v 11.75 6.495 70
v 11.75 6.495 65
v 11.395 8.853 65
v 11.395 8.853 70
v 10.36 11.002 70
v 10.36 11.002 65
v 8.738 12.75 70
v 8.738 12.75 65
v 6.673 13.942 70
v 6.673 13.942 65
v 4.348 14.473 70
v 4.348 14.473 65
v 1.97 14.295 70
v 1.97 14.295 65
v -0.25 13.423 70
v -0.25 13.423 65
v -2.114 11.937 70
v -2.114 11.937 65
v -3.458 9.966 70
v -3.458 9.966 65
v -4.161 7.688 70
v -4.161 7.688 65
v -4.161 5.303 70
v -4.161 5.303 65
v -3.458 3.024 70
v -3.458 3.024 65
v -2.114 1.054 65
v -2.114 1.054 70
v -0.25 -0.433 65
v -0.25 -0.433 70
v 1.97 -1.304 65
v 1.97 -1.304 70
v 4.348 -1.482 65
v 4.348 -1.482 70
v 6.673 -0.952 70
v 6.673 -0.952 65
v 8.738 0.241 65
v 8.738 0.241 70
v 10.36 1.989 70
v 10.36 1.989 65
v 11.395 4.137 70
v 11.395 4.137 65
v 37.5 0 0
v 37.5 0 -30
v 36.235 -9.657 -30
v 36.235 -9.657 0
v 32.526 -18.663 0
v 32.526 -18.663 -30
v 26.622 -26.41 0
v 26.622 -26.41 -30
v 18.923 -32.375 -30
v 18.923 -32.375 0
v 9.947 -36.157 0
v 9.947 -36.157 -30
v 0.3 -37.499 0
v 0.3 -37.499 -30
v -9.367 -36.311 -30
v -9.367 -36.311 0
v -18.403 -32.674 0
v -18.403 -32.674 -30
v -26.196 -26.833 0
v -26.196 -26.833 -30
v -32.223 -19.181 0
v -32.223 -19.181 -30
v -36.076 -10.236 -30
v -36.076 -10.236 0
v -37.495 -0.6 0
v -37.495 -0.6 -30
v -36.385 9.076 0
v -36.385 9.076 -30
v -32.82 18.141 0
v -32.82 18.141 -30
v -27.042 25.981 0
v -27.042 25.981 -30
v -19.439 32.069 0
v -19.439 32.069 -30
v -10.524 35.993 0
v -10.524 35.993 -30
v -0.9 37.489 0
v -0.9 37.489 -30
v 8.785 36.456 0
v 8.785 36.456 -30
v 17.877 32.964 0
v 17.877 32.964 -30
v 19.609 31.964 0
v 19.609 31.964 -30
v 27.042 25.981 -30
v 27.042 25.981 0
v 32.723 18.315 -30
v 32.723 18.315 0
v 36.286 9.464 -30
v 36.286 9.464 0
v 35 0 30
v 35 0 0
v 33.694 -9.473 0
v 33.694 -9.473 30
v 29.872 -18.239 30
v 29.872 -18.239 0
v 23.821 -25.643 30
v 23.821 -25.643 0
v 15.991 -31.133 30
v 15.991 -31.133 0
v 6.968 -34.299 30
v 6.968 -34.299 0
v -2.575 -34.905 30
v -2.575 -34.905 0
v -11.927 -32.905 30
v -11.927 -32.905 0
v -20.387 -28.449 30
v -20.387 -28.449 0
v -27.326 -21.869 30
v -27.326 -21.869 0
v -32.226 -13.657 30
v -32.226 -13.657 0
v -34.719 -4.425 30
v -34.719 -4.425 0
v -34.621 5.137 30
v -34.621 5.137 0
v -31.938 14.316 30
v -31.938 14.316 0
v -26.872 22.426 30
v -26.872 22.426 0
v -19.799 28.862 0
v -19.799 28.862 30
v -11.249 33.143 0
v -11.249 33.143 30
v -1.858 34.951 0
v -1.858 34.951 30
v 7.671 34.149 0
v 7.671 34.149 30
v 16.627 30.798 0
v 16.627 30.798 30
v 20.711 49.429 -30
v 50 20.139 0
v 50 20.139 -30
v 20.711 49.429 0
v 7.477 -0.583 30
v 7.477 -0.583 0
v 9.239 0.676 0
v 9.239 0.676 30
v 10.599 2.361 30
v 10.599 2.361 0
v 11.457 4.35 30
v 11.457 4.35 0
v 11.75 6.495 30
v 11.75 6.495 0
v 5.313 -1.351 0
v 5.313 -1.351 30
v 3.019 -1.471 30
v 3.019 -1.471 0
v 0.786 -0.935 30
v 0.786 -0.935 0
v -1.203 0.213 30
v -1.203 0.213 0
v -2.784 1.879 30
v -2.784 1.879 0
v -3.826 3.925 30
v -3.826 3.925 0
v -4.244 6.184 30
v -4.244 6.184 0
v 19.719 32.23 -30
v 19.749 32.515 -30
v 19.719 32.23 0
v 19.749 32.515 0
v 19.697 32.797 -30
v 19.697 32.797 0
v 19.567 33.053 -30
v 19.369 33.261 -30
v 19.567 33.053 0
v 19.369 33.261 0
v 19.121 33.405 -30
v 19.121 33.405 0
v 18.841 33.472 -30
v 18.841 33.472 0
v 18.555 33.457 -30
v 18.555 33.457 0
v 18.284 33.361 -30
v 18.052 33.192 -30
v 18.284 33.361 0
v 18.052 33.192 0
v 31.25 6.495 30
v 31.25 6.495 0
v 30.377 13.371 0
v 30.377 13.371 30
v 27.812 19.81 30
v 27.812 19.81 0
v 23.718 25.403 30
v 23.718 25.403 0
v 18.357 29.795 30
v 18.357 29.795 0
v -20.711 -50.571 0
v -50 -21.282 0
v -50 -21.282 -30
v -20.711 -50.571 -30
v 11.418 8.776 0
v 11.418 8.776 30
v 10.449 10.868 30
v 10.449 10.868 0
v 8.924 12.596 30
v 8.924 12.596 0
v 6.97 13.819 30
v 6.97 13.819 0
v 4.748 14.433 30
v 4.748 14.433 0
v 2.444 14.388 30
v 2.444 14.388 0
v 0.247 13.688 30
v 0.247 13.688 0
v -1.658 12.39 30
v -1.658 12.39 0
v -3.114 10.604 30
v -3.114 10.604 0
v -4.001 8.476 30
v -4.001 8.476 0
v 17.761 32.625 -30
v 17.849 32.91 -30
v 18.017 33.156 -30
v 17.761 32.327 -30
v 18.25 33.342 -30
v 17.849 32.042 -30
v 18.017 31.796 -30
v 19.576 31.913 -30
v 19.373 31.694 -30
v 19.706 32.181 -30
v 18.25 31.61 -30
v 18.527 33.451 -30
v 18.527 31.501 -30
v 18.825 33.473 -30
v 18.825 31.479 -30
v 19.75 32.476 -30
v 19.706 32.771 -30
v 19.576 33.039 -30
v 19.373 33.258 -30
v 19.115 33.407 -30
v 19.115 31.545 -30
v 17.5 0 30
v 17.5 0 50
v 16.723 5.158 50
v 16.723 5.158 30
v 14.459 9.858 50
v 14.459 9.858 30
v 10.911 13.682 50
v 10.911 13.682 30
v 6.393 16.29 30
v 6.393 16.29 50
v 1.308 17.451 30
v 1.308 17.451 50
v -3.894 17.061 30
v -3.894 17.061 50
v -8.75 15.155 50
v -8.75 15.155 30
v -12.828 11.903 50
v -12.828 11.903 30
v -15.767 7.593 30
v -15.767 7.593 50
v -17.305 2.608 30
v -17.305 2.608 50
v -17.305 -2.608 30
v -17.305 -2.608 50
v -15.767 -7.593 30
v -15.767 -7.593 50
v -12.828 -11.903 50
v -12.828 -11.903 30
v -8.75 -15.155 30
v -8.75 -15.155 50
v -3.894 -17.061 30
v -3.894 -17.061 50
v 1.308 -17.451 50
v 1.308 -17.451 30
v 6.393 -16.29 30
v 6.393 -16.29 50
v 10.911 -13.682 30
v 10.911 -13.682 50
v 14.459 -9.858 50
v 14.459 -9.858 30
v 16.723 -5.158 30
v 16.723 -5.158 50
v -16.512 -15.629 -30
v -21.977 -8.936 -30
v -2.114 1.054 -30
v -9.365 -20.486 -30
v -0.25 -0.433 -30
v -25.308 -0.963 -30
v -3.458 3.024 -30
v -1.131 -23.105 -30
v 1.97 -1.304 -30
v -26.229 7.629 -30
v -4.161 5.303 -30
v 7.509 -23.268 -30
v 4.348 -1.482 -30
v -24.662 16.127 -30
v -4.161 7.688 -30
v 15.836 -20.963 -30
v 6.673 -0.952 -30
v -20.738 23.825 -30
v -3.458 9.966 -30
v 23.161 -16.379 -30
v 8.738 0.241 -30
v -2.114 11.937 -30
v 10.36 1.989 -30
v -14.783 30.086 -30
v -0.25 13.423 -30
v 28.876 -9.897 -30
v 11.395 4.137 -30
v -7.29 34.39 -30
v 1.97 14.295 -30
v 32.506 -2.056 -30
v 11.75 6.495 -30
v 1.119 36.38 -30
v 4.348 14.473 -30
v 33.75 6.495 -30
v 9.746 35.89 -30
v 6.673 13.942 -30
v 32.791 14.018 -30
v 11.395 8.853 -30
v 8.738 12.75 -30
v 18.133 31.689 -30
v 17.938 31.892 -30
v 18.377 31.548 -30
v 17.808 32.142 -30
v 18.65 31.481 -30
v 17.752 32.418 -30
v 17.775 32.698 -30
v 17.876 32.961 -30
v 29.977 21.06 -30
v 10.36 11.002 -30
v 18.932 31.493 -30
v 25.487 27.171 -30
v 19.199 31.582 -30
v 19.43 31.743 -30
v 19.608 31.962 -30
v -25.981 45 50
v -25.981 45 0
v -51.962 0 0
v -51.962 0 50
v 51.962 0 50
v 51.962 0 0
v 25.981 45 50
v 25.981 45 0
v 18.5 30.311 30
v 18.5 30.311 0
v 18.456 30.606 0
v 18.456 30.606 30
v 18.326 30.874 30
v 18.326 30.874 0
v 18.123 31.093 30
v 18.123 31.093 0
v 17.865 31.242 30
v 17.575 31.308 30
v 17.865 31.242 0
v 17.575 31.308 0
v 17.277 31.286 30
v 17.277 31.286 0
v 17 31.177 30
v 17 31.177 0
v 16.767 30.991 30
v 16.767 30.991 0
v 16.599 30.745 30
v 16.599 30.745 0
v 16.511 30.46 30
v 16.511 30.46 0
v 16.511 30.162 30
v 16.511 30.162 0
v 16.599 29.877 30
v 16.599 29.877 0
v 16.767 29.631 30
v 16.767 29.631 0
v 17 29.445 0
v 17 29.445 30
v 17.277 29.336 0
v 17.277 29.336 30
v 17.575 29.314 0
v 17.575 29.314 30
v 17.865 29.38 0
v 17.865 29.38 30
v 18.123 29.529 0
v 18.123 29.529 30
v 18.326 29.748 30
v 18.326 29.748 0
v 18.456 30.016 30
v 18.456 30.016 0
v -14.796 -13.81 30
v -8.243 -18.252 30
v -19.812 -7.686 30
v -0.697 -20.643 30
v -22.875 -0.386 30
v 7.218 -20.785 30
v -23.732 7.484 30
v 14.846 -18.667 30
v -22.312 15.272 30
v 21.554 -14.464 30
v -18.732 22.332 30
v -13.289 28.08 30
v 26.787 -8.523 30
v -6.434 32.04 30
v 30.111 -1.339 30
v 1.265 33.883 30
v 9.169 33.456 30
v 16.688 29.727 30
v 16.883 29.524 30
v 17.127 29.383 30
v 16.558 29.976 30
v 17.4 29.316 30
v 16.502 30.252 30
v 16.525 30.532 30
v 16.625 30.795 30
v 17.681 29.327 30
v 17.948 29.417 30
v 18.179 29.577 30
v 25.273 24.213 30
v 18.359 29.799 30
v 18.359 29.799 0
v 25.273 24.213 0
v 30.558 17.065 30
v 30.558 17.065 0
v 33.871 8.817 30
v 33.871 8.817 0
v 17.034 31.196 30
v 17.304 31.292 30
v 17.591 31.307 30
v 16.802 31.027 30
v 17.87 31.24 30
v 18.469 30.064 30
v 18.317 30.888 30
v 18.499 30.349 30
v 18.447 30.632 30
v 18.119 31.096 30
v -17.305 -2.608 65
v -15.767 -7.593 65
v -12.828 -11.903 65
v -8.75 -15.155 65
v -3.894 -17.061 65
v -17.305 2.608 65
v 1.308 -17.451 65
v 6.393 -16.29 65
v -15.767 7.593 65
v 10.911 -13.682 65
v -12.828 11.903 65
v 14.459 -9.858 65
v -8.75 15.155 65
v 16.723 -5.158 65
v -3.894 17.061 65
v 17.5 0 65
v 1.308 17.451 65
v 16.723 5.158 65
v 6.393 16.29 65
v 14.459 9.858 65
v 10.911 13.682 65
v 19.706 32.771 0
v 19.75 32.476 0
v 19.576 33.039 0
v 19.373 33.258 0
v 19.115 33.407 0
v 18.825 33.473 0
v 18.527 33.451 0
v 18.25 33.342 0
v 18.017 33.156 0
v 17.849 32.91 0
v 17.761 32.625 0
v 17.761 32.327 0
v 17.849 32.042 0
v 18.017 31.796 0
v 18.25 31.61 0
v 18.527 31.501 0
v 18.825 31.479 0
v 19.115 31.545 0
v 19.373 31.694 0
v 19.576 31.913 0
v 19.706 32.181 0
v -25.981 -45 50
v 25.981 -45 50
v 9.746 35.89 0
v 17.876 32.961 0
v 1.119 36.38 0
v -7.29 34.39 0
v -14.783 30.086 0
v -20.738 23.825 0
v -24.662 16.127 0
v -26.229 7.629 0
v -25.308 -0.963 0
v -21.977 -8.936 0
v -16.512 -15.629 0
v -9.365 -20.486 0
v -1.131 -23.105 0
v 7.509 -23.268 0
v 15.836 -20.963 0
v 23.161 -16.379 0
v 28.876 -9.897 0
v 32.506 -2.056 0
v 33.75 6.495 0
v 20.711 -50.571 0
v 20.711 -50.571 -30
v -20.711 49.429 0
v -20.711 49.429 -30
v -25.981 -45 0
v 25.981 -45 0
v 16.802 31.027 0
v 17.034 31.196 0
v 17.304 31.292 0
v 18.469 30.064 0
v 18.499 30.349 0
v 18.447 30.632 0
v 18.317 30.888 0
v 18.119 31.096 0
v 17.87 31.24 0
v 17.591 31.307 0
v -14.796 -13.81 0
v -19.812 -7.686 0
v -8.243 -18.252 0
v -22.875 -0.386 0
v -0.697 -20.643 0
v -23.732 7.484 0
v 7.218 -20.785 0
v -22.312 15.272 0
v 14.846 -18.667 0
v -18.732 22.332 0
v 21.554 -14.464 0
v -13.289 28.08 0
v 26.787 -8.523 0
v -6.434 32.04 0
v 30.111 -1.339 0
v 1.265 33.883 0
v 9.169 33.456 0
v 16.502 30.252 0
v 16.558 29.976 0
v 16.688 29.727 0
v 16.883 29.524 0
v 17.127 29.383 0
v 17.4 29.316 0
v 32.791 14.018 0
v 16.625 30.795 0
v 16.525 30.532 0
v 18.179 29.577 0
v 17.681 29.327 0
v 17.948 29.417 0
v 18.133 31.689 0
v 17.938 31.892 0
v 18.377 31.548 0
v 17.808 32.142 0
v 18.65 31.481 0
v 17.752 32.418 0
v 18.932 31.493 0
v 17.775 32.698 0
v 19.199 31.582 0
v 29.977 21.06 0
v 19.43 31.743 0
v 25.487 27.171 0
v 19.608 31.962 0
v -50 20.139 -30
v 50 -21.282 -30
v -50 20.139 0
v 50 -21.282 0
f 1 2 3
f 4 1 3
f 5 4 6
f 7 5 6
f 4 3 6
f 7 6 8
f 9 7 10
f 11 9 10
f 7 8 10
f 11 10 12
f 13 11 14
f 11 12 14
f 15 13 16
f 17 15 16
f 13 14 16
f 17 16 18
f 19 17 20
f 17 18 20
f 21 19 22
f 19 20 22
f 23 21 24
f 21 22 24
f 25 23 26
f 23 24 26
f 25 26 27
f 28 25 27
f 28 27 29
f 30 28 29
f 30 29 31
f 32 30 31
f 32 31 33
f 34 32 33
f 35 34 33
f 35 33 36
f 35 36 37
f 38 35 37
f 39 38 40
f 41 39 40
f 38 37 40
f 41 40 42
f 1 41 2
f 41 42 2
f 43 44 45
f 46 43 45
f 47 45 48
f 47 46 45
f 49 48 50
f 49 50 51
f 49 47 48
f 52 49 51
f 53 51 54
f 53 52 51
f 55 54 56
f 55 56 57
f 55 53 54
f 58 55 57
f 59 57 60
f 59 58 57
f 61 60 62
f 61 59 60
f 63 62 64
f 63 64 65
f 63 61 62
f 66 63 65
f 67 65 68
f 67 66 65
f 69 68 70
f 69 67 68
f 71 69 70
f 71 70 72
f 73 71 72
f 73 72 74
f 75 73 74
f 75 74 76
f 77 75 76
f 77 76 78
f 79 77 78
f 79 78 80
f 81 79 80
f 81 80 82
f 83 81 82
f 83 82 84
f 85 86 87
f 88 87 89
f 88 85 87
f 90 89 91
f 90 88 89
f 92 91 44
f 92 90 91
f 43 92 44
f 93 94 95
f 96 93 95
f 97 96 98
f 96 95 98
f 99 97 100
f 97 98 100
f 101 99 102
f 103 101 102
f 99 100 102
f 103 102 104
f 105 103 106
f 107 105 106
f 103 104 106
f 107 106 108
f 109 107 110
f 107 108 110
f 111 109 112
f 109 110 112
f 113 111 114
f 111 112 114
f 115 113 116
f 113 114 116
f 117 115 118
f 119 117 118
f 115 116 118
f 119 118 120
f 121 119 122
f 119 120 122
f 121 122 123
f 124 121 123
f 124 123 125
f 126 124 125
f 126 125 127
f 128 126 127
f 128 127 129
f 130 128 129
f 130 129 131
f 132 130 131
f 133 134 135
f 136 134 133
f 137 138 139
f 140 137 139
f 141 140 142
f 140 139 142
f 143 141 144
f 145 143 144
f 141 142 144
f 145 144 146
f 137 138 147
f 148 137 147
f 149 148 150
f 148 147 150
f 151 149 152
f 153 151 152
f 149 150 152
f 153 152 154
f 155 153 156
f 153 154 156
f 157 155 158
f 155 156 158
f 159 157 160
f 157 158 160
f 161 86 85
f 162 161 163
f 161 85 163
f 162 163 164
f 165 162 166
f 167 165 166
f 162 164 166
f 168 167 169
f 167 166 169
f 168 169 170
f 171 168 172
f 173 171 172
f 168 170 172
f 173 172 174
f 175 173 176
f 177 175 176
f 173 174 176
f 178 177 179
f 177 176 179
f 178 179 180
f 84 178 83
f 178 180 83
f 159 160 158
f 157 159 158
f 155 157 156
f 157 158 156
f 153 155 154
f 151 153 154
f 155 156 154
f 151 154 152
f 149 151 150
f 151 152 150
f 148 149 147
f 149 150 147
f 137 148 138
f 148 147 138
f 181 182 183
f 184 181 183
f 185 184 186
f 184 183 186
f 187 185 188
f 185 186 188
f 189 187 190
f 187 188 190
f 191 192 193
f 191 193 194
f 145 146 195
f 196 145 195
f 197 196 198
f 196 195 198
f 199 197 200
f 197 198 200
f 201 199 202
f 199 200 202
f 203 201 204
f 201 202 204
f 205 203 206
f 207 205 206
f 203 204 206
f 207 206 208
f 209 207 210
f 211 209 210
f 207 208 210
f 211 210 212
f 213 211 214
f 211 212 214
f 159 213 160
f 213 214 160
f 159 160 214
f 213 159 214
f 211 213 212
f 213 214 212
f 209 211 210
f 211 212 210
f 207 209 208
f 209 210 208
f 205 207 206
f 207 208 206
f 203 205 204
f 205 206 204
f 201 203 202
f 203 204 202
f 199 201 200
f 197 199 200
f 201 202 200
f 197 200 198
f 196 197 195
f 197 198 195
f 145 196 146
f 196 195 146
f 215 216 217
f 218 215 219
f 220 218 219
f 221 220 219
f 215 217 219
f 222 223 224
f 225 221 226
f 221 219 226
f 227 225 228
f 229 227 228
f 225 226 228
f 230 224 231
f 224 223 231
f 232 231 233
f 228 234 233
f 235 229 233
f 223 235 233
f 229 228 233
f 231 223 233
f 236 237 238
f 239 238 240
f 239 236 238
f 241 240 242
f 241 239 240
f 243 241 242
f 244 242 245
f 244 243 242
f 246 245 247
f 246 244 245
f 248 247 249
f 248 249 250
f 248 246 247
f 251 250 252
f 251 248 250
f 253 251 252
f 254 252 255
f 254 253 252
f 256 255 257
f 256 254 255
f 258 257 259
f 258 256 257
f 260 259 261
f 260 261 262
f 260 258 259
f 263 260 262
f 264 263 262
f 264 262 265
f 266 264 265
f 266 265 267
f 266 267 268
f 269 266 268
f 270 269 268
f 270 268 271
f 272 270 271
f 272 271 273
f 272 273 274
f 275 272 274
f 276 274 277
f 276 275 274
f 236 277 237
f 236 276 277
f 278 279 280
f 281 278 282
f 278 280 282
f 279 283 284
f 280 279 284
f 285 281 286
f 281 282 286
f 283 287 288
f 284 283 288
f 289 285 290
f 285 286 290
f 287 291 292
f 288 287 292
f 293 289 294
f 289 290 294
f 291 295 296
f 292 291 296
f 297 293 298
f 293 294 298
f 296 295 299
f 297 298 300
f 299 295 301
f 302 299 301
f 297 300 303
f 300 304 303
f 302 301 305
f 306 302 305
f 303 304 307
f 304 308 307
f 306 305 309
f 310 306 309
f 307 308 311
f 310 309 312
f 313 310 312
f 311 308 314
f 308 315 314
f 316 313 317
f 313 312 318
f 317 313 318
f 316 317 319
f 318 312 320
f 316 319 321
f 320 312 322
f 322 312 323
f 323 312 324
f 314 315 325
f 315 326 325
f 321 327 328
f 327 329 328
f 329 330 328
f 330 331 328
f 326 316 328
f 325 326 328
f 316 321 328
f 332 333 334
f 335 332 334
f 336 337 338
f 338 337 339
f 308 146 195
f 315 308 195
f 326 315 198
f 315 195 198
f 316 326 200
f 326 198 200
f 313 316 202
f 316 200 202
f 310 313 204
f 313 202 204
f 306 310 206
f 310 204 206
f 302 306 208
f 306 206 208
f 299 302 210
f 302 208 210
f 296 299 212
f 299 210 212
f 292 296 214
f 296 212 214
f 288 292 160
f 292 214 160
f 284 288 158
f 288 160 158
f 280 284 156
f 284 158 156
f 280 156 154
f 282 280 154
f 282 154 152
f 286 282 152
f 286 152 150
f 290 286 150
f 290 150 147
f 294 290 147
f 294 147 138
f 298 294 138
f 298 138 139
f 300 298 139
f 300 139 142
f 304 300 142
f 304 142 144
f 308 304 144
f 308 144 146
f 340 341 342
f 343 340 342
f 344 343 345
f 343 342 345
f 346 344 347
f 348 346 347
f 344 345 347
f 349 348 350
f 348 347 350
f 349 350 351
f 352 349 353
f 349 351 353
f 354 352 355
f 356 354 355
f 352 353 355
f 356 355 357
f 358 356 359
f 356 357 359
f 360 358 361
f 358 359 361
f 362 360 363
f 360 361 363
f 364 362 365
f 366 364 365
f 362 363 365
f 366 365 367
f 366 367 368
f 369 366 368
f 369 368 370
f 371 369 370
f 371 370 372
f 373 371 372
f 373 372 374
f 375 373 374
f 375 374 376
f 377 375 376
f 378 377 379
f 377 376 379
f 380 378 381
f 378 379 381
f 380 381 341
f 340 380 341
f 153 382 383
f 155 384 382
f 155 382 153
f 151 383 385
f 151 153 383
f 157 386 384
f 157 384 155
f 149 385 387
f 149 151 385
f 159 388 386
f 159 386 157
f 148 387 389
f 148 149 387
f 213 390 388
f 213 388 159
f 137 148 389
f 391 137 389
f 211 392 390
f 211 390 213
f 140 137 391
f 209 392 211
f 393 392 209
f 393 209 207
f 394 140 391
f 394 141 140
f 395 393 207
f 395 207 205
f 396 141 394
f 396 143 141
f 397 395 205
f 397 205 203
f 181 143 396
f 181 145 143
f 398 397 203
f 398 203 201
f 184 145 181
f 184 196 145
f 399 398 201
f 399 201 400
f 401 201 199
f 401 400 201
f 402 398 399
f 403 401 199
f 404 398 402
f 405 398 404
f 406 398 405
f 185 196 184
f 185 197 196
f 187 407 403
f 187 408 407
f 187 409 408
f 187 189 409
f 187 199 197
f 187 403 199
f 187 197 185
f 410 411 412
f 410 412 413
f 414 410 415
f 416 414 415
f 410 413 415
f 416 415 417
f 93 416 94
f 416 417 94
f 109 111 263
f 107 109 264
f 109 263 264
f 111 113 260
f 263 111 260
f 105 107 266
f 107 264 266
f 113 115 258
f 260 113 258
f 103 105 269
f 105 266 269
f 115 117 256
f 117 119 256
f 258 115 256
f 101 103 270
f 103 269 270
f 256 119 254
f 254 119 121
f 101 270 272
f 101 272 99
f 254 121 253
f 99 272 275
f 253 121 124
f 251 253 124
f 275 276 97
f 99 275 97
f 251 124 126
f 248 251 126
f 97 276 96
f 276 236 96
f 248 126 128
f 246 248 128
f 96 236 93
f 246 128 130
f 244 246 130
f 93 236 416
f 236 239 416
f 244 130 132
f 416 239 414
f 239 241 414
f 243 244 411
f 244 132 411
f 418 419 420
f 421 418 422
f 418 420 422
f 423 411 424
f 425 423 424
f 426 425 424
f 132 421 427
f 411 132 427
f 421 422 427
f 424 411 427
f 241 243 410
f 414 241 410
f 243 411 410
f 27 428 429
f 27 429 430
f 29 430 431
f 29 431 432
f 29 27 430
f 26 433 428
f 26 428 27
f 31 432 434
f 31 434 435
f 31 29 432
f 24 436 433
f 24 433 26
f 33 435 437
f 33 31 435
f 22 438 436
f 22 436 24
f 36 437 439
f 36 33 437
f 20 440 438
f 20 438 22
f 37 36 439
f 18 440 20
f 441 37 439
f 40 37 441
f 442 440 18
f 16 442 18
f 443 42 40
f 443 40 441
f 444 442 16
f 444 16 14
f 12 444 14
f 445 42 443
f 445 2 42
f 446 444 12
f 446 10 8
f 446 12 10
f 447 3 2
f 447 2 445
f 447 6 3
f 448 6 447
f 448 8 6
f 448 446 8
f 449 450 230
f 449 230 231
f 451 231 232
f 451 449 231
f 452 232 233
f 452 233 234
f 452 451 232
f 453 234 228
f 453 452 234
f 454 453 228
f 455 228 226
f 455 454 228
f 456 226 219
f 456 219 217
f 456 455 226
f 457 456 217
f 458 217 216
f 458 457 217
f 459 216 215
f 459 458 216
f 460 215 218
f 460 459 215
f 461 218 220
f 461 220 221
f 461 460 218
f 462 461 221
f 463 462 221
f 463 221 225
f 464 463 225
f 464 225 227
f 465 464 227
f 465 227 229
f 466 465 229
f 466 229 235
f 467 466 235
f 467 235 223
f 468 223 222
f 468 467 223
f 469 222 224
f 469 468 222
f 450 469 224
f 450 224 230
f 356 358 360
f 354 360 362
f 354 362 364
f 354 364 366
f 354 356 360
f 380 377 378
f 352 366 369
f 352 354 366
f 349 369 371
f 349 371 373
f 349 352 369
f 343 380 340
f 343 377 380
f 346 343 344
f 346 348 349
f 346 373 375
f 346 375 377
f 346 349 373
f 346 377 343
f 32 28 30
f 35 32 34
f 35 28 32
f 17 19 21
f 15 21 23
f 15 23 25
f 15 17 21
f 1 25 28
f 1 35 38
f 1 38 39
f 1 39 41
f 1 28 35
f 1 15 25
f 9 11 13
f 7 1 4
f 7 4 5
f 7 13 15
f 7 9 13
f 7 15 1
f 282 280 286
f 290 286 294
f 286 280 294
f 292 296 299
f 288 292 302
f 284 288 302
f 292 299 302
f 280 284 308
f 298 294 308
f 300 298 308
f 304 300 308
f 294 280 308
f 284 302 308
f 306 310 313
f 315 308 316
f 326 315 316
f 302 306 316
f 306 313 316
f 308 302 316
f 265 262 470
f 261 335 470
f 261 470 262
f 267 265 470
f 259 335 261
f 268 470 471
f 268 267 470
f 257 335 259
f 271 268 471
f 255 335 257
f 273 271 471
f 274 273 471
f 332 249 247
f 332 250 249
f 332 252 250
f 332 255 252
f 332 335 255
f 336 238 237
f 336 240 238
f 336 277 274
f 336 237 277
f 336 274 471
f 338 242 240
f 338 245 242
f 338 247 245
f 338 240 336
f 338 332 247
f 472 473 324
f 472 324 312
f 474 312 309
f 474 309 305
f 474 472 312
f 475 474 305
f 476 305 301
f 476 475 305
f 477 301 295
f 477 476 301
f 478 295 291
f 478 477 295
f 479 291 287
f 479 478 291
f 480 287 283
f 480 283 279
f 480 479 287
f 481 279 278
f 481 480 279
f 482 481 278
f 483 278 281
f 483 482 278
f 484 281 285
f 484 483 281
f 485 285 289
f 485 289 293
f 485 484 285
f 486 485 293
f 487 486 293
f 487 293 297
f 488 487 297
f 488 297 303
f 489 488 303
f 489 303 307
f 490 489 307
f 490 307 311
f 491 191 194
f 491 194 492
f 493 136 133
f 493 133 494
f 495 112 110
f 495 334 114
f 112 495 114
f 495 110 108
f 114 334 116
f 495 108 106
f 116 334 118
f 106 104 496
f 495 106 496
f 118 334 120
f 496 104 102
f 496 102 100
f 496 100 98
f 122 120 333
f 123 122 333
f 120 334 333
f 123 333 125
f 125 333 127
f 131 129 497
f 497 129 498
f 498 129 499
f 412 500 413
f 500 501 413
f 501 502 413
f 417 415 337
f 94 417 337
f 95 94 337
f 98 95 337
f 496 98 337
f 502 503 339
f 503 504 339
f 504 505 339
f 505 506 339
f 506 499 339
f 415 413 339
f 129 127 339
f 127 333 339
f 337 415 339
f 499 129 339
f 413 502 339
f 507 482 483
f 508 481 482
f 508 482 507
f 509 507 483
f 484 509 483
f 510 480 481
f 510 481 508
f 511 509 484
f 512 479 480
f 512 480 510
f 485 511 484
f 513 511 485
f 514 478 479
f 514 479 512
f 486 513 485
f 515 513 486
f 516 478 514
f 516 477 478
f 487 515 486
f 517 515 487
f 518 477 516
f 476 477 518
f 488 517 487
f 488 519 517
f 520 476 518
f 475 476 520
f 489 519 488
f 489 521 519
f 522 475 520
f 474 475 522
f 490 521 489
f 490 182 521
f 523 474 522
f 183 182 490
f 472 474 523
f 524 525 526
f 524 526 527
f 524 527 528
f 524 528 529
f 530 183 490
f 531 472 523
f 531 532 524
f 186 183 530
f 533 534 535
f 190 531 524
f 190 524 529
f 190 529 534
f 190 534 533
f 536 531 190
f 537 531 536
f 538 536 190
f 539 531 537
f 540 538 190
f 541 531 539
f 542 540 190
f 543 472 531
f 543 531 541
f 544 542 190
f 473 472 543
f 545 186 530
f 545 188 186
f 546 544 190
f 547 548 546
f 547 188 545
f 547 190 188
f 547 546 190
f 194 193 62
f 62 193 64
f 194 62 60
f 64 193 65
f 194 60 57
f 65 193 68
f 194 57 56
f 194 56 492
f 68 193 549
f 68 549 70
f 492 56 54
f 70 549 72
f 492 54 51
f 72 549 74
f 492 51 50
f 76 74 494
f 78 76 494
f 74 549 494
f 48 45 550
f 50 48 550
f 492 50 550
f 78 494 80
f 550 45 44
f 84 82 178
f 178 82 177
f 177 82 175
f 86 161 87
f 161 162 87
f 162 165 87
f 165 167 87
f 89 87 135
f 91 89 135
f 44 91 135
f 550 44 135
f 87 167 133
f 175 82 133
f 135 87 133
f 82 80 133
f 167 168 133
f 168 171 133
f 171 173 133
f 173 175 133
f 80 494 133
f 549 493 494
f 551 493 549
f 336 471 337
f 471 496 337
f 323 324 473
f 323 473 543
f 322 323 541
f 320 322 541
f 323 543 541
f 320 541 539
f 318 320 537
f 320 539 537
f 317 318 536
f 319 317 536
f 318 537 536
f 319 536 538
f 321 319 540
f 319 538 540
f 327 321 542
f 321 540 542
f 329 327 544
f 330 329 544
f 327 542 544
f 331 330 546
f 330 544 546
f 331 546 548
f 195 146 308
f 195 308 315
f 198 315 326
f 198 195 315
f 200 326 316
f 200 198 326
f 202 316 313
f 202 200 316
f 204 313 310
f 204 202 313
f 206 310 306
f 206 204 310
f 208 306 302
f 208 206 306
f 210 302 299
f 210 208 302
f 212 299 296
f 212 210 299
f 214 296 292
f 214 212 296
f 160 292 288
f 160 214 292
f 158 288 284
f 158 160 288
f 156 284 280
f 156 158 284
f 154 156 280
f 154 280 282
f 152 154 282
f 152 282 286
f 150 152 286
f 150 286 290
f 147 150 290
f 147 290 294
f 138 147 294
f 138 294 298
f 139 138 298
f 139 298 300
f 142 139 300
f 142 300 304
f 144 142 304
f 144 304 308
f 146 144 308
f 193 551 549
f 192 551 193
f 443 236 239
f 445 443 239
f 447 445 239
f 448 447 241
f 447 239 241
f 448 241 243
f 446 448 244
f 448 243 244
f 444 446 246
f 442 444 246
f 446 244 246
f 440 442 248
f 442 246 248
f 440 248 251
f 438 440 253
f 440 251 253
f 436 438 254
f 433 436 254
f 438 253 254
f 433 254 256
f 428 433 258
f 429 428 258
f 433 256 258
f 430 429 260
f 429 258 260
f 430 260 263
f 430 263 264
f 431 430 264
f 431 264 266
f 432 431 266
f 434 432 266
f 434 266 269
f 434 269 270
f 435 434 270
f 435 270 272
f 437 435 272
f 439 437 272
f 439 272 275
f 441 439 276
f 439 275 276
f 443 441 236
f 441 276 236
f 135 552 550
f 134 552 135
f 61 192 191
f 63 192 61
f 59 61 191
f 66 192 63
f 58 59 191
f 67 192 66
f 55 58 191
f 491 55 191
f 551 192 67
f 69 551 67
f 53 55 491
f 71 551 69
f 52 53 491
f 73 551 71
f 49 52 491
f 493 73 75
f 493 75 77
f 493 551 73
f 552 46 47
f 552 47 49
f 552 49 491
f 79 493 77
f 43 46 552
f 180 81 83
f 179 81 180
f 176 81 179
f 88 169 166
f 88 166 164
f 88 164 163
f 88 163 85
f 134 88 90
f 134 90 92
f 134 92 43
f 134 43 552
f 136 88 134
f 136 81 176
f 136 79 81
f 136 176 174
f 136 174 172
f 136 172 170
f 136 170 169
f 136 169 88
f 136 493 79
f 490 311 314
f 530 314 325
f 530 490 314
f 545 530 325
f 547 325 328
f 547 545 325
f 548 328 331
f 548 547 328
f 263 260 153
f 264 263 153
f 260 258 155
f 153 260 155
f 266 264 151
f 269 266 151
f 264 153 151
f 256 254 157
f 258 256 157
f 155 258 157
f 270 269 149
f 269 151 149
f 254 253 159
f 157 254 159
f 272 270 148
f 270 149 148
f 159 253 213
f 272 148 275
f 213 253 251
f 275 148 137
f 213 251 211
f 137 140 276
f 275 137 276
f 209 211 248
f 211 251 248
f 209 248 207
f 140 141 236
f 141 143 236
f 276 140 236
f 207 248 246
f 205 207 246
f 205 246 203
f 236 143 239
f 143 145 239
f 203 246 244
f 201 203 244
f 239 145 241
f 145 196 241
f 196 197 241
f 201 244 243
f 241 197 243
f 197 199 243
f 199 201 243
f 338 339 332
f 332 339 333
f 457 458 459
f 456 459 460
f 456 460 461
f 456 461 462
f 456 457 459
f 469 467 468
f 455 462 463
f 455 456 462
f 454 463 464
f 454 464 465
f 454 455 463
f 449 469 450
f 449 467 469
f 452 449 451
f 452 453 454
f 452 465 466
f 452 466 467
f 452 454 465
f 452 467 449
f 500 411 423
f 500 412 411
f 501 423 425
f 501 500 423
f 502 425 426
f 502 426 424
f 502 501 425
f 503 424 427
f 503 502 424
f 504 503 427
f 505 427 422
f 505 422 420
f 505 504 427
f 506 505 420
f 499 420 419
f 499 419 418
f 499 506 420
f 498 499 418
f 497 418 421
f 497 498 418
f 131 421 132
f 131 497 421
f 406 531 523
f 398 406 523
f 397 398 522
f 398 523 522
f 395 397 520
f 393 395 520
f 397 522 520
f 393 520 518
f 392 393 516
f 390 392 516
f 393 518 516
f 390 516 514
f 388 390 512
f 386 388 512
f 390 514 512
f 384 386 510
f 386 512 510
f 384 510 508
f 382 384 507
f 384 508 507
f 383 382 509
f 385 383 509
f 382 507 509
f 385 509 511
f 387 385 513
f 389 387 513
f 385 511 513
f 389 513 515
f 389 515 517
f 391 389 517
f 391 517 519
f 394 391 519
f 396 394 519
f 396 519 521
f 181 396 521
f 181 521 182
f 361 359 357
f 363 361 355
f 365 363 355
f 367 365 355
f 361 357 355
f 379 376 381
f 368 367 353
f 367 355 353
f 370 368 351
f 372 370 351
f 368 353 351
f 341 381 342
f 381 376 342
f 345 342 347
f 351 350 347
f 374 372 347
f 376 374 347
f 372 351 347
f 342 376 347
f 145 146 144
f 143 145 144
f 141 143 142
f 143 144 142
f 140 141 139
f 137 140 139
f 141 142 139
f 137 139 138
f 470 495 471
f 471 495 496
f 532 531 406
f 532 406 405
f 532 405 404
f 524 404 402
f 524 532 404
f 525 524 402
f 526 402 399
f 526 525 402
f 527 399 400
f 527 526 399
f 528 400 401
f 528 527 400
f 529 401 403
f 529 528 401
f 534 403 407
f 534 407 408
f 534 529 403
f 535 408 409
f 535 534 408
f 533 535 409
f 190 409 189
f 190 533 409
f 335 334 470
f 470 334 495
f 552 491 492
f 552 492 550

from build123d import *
from build123d import SkipClean  # not in build123d's __all__

# Parameters (mm, degrees)
F1_DEPTH  = 30
F2_R      = 17.5
F3_DEPTH  = 20
F0_R      = 17.5
F4_DEPTH  = 30
F5_R      = 17.5
F6_DEPTH  = 35
F7_DEPTH  = 30
F8_R      = 8
F9_DEPTH  = 30
F10_R     = 8
F11_DEPTH = 5
F13_DEPTH = 30
F14_R     = 8
F15_DEPTH = 30
F16_R     = 1
F17_DEPTH = 30
F18_DEPTH = 30


# Not quite as in the source:
# - after a boolean that leaves OpenCascade's solid faulty, fix() repairs it


with BuildPart() as f1:
    # F0 (on Top) → F1 (new body)
    with BuildSketch(Plane.XY):
        with BuildLine():
            ThreePointArc((7.4772695936, -0.5834718719), (7.494315244, -0.29195723), (7.5, 0))
            ThreePointArc((7.5, 0), (6.4951905284, 3.75), (3.75, 6.4951905284))
            ThreePointArc((3.75, 6.4951905284), (-0.29195723, 7.494315244), (-4.2439362602, 6.183769483))
            ThreePointArc((-4.2439362602, 6.183769483), (-0.25, -0.4330127019), (7.4772695936, -0.5834718719))
        make_face()
        with BuildLine():
            ThreePointArc((3.75, 6.4951905284), (6.4951905284, 3.75), (7.5, 0))
            ThreePointArc((7.5, 0), (7.494315244, -0.29195723), (7.4772695936, -0.5834718719))
            ThreePointArc((7.4772695936, -0.5834718719), (10.5990202492, 2.3610737393), (11.75, 6.4951905284))
            ThreePointArc((11.75, 6.4951905284), (3.5942599631, 14.4936744498), (-4.2439362602, 6.183769483))
            ThreePointArc((-4.2439362602, 6.183769483), (-0.29195723, 7.494315244), (3.75, 6.4951905284))
        make_face()
    extrude(amount=F1_DEPTH)

    # F5 (on face) → F6 (join)
    with BuildSketch(Plane.XY.offset(30)):
        Circle(F5_R)
        with BuildLine():
            ThreePointArc((-4.2439362602, 6.183769483), (7.75, 13.4233937587), (7.4772695936, -0.5834718719))
            ThreePointArc((7.4772695936, -0.5834718719), (-3.75, -6.4951905284), (-4.2439362602, 6.183769483))
        make_face(mode=Mode.SUBTRACT)
        with BuildLine():
            ThreePointArc((-4.2439362602, 6.183769483), (-3.75, -6.4951905284), (7.4772695936, -0.5834718719))
            ThreePointArc((7.4772695936, -0.5834718719), (7.75, 13.4233937587), (-4.2439362602, 6.183769483))
        make_face()
    extrude(amount=F6_DEPTH)

    # F8 (on face) → F9 (join)
    with BuildSketch(Plane.XY):
        with Locations((3.75, 6.4951905284)):
            Circle(F8_R)
    extrude(amount=-F9_DEPTH)

    # F10 (on face) → F11 (join)
    with BuildSketch(Plane.XY.offset(65)):
        with Locations((3.75, 6.4951905284)):
            Circle(F10_R)
    extrude(amount=F11_DEPTH)


with BuildPart() as f1b:
    # F0 (on Top) → F1, piece 2 (new body)
    with BuildSketch(Plane.XY):
        Polygon((25.9807621135, 45), (-25.9807621135, 45), (-51.9615242271, 0), (-25.9807621135, -45), (25.9807621135, -45), (51.9615242271, 0), align=None)
        with BuildLine():
            ThreePointArc((35, 0), (-30.3108892273, -17.4999998357), (17.5000003287, 30.3108889427))
            ThreePointArc((17.5000003287, 30.3108889427), (30.3108892273, 17.4999998357), (35, 0))
        make_face(mode=Mode.SUBTRACT)
    extrude(amount=F1_DEPTH)

    # F2 (on face) → F3 (join)
    with BuildSketch(Plane.XY.offset(30)):
        Polygon((-25.9807621135, 45), (-51.9615242271, 0), (-25.9807621135, -45), (25.9807621135, -45), (51.9615242271, 0), (25.9807621135, 45), align=None)
        Circle(F2_R, mode=Mode.SUBTRACT)
    extrude(amount=F3_DEPTH)


with BuildPart() as f4:
    # F0 (on Top) → F4 (new body)
    with BuildSketch(Plane.XY):
        with BuildLine():
            ThreePointArc((17.5000003287, 30.3108889427), (-20.0656986989, -7.2548093073), (31.25, 6.4951905284))
            ThreePointArc((31.25, 6.4951905284), (27.5656986989, 20.2451903641), (17.5000003287, 30.3108889427))
        make_face()
        Circle(F0_R, mode=Mode.SUBTRACT)
        Circle(F0_R)
        with BuildLine():
            ThreePointArc((11.75, 6.4951905284), (10.5990202492, 2.3610737393), (7.4772695936, -0.5834718719))
            ThreePointArc((7.4772695936, -0.5834718719), (-3.75, -6.4951905284), (-4.2439362602, 6.183769483))
            ThreePointArc((-4.2439362602, 6.183769483), (3.5942599631, 14.4936744498), (11.75, 6.4951905284))
        make_face(mode=Mode.SUBTRACT)
    extrude(amount=F4_DEPTH)

    # F0 (on Top) → F7 (join)
    with BuildSketch(Plane.XY):
        with BuildLine():
            ThreePointArc((17.5000003287, 30.3108889427), (-20.0656986989, -7.2548093073), (31.25, 6.4951905284))
            ThreePointArc((31.25, 6.4951905284), (27.5656986989, 20.2451903641), (17.5000003287, 30.3108889427))
        make_face()
        Circle(F0_R, mode=Mode.SUBTRACT)
        Circle(F0_R)
        with BuildLine():
            ThreePointArc((11.75, 6.4951905284), (10.5990202492, 2.3610737393), (7.4772695936, -0.5834718719))
            ThreePointArc((7.4772695936, -0.5834718719), (-3.75, -6.4951905284), (-4.2439362602, 6.183769483))
            ThreePointArc((-4.2439362602, 6.183769483), (3.5942599631, 14.4936744498), (11.75, 6.4951905284))
        make_face(mode=Mode.SUBTRACT)
        with BuildLine():
            ThreePointArc((-4.2439362602, 6.183769483), (-3.75, -6.4951905284), (7.4772695936, -0.5834718719))
            ThreePointArc((7.4772695936, -0.5834718719), (-0.25, -0.4330127019), (-4.2439362602, 6.183769483))
        make_face()
    extrude(amount=F7_DEPTH)

    # F14 (on face) → F15 (join)
    with BuildSketch(Plane.XY):
        with BuildLine():
            ThreePointArc((18.7499993484, 32.4759530181), (-22.2307619254, -8.5048097974), (33.75, 6.4951905284))
            ThreePointArc((33.75, 6.4951905284), (29.7307619254, 21.4951908542), (18.7499993484, 32.4759530181))
        make_face()
        with Locations((3.75, 6.4951905284)):
            Circle(F14_R, mode=Mode.SUBTRACT)
    with SkipClean():  # cleaning this boolean's faces spoils the solid; the shape is the same uncleaned
        extrude(amount=-F15_DEPTH)


with BuildPart() as f13:
    # F12 (on Top) → F13 (new body)
    with BuildSketch(Plane.XY):
        Polygon((50, 20.1392216345), (20.7106781187, 49.4285435158), (-20.7106781187, 49.4285435158), (-50, 20.1392216345), (-50, -21.2821346028), (-20.7106781187, -50.5714564842), (20.7106781187, -50.5714564842), (50, -21.2821346028), align=None)
        with BuildLine():
            ThreePointArc((18.7499993484, 32.4759530181), (32.4759524538, 18.7500003258), (37.5, 0))
            ThreePointArc((37.5, 0), (-32.4759524538, -18.7500003258), (18.7499993484, 32.4759530181))
        make_face(mode=Mode.SUBTRACT)
    extrude(amount=-F13_DEPTH)


with BuildPart() as f17:
    # F16 (on Top) → F17 (new body)
    with BuildSketch(Plane.XY):
        with Locations((17.5, 30.3108891325)):
            Circle(F16_R)
    extrude(amount=F17_DEPTH)


with BuildPart() as f18:
    # F16 (on Top) → F18 (new body)
    with BuildSketch(Plane.XY):
        with Locations((18.75, 32.4759526419)):
            Circle(F16_R)
    extrude(amount=-F18_DEPTH)


with BuildPart() as f1b_1:
    add(f1b.part, clean=False)

    # F19: cut F17
    add(f17.part, mode=Mode.SUBTRACT)


with BuildPart() as f4_1:
    add(f4.part, clean=False)

    # F19: cut F17
    add(f17.part, mode=Mode.SUBTRACT)

    add(f4_1.part.fix(), mode=Mode.REPLACE)

    # F20: cut F18
    add(f18.part, mode=Mode.SUBTRACT)


with BuildPart() as f13_1:
    add(f13.part, clean=False)

    # F20: cut F18
    add(f18.part, mode=Mode.SUBTRACT)


solid = Compound([f1.part, f17.part, f18.part, f1b_1.part, f4_1.part, f13_1.part])
